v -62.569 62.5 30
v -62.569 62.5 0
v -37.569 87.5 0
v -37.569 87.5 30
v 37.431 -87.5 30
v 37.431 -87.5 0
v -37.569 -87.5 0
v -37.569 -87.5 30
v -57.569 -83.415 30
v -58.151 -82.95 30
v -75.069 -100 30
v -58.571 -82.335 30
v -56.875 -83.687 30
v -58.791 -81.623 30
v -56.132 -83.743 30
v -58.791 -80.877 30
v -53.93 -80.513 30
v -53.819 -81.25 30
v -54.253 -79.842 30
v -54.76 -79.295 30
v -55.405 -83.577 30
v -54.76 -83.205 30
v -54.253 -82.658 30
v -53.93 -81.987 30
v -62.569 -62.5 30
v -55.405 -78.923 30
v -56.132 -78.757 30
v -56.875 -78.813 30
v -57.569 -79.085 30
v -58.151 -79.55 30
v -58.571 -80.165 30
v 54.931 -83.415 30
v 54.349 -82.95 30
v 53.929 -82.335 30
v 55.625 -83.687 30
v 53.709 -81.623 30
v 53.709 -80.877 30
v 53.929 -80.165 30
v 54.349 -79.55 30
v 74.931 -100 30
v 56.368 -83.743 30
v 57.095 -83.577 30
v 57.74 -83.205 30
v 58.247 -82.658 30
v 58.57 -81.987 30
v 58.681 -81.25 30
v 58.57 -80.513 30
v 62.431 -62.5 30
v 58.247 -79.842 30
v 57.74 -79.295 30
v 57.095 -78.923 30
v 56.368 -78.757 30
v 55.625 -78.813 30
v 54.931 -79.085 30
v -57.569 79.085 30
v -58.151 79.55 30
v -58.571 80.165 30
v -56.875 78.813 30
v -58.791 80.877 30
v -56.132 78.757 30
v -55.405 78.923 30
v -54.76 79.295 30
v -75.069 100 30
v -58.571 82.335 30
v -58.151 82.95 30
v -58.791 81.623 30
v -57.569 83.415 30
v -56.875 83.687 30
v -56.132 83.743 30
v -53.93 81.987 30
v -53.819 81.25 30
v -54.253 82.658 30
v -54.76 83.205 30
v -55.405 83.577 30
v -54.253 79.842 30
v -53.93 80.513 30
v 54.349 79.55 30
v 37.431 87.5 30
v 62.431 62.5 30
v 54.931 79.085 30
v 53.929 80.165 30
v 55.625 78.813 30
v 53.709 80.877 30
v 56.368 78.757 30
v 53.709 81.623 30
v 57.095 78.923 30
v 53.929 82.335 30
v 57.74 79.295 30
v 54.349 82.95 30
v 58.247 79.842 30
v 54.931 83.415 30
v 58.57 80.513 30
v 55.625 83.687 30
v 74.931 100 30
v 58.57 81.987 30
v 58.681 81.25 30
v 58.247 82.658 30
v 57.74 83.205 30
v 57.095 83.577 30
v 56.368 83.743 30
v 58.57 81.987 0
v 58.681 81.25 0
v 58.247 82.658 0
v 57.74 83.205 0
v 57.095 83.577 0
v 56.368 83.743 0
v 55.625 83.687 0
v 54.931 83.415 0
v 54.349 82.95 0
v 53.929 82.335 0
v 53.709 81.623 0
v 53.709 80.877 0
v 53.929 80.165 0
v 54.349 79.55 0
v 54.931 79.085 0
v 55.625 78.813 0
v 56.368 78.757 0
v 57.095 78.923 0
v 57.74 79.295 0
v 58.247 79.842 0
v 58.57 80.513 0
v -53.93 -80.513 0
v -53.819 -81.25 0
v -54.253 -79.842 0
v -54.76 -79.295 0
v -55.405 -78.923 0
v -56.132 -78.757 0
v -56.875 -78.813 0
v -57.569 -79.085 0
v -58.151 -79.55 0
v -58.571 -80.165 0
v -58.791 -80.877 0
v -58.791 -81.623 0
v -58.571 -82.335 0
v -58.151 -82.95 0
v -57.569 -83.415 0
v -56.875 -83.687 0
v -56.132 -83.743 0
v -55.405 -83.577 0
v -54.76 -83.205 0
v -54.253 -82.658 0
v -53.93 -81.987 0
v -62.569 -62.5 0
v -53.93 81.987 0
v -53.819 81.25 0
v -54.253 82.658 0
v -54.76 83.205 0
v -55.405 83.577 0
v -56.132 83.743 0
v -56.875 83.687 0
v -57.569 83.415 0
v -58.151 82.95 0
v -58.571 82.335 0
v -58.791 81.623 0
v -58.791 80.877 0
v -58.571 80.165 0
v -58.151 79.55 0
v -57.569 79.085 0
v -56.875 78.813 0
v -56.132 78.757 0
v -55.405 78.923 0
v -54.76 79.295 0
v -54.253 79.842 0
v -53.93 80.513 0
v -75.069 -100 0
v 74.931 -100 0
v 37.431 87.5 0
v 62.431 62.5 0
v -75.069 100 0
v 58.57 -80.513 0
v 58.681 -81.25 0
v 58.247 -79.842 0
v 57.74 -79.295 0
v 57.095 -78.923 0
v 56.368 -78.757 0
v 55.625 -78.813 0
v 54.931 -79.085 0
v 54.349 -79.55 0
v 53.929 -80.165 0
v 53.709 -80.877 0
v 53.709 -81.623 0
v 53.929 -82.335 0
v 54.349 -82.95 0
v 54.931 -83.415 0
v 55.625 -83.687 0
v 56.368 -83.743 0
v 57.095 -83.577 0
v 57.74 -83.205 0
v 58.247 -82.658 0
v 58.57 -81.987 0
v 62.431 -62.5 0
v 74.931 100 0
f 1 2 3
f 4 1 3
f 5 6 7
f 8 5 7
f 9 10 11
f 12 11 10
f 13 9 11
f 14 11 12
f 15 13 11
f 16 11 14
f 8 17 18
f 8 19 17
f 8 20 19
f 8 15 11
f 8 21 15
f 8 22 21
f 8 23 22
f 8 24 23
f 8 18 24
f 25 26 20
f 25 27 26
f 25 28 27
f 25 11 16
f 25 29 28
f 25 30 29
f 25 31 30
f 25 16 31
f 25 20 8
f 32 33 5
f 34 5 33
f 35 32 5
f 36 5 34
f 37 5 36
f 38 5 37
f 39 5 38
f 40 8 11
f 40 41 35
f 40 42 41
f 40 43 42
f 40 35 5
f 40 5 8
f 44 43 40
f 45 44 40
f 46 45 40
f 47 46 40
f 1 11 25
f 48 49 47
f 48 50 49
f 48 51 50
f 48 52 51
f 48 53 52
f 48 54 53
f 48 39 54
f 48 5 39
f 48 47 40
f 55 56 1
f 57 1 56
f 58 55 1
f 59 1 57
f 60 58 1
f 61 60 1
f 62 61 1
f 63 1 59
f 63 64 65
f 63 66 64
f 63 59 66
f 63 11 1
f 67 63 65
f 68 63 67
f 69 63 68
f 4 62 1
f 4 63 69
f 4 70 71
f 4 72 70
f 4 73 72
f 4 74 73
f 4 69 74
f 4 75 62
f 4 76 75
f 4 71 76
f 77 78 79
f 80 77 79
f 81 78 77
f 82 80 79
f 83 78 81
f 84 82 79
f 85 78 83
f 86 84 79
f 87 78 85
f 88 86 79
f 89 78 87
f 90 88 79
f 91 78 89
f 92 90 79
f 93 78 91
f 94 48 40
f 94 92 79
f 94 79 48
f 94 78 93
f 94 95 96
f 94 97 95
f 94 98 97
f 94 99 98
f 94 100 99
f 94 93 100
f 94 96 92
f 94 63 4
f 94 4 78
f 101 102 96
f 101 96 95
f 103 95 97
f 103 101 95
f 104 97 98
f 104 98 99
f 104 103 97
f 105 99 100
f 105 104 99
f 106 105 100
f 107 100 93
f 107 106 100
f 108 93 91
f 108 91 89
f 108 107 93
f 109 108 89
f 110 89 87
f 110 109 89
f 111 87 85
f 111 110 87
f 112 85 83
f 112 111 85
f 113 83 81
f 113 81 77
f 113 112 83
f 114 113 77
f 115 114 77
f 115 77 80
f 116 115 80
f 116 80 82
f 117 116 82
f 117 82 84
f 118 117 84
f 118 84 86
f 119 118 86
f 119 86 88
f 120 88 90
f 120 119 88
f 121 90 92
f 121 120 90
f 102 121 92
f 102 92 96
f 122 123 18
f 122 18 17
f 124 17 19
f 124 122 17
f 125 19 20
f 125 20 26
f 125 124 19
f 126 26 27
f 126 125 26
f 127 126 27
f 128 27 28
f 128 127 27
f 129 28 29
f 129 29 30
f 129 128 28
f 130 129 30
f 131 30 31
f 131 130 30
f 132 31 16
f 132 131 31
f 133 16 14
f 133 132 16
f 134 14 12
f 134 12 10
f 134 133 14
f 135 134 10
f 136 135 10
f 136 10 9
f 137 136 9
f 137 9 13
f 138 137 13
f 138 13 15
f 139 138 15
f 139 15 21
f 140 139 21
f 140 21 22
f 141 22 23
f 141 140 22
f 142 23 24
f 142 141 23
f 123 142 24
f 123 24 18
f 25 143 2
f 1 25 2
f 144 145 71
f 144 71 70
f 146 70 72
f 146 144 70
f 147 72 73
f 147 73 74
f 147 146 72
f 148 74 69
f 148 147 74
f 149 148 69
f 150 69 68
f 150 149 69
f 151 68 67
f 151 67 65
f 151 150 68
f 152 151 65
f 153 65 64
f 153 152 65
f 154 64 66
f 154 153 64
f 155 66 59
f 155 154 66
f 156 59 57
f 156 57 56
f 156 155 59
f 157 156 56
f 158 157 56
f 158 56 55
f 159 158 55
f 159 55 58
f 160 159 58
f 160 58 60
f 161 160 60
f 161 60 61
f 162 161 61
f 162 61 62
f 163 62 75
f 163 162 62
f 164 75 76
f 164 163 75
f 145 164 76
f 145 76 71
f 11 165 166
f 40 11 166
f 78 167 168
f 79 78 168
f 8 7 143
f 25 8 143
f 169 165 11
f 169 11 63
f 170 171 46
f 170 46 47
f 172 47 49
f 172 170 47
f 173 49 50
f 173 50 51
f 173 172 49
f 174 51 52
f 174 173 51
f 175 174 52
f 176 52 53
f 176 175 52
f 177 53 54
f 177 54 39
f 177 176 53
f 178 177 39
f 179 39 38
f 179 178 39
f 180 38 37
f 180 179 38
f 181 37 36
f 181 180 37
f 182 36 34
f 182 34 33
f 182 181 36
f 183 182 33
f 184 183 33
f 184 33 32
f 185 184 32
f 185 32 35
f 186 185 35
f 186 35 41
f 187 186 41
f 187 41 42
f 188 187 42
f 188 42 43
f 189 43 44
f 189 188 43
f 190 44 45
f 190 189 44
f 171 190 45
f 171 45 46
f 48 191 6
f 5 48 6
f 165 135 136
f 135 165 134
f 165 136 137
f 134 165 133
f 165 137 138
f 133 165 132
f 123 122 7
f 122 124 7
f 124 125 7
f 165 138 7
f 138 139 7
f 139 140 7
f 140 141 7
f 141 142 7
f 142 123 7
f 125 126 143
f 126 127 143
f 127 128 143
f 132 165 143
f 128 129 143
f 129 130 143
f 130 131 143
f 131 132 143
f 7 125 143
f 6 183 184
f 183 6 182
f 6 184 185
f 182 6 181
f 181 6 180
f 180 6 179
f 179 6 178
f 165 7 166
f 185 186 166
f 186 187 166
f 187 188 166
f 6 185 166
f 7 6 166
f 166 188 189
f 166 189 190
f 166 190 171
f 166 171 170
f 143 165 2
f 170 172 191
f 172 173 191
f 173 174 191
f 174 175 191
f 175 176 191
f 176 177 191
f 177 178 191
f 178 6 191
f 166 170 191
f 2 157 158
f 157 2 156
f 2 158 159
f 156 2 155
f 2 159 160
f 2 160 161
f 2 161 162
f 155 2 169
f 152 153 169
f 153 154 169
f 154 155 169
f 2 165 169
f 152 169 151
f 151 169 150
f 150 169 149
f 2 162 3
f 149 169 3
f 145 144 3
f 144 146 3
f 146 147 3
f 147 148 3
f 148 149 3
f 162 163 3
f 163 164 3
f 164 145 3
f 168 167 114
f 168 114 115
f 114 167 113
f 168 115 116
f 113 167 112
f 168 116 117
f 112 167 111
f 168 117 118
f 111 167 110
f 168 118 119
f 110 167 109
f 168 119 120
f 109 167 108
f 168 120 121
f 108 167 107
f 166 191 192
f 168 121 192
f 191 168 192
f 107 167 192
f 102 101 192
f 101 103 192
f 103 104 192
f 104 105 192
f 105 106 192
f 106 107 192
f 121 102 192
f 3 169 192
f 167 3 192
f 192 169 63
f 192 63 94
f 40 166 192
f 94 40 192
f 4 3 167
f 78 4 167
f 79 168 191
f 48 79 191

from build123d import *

# Parameters (mm, degrees)
F0_W     = 150
F0_H     = 200
F0_W_2   = 137.5
F0_H_2   = 187.5
F0_R     = 5
F0_R_2   = 2.5
F1_DEPTH = 30


with BuildPart() as f1:
    # F0 (on Top) → F1 (new body)
    with BuildSketch(Plane.XY):
        with Locations((-0.0686573694, 0)):
            Rectangle(F0_W, F0_H)
        with Locations((-0.0686573694, 0)):
            Rectangle(F0_W_2, F0_H_2, mode=Mode.SUBTRACT)
        with Locations((-0.0686573694, 0)):
            Rectangle(F0_W_2, F0_H_2)
        Polygon((-62.5686573694, 62.5), (-62.5686573694, 87.5), (-37.5686573694, 87.5), (37.4313426306, 87.5), (62.4313426306, 87.5), (62.4313426306, 62.5), (62.4313426306, -62.5), (62.4313426306, -87.5), (37.4313426306, -87.5), (-37.5686573694, -87.5), (-62.5686573694, -87.5), (-62.5686573694, -62.5), align=None, mode=Mode.SUBTRACT)
        Polygon((-37.5686573694, 87.5), (-62.5686573694, 87.5), (-62.5686573694, 62.5), align=None)
        with Locations((-56.3186573694, 81.25)):
            Circle(F0_R, mode=Mode.SUBTRACT)
        Polygon((62.4313426306, 87.5), (37.4313426306, 87.5), (62.4313426306, 62.5), align=None)
        with Locations((56.1813426306, 81.25)):
            Circle(F0_R, mode=Mode.SUBTRACT)
        Polygon((62.4313426306, -87.5), (62.4313426306, -62.5), (37.4313426306, -87.5), align=None)
        with Locations((56.1813426306, -81.25)):
            Circle(F0_R, mode=Mode.SUBTRACT)
        Polygon((-37.5686573694, -87.5), (-62.5686573694, -62.5), (-62.5686573694, -87.5), align=None)
        with Locations((-56.3186573694, -81.25)):
            Circle(F0_R, mode=Mode.SUBTRACT)
        with Locations((-56.3186573694, 81.25)):
            Circle(F0_R)
        with Locations((-56.3186573694, 81.25)):
            Circle(F0_R_2, mode=Mode.SUBTRACT)
        with Locations((56.1813426306, 81.25)):
            Circle(F0_R)
        with Locations((56.1813426306, 81.25)):
            Circle(F0_R_2, mode=Mode.SUBTRACT)
        with Locations((56.1813426306, -81.25)):
            Circle(F0_R)
        with Locations((56.1813426306, -81.25)):
            Circle(F0_R_2, mode=Mode.SUBTRACT)
        with Locations((-56.3186573694, -81.25)):
            Circle(F0_R)
        with Locations((-56.3186573694, -81.25)):
            Circle(F0_R_2, mode=Mode.SUBTRACT)
    extrude(amount=F1_DEPTH)


solid = f1.part
